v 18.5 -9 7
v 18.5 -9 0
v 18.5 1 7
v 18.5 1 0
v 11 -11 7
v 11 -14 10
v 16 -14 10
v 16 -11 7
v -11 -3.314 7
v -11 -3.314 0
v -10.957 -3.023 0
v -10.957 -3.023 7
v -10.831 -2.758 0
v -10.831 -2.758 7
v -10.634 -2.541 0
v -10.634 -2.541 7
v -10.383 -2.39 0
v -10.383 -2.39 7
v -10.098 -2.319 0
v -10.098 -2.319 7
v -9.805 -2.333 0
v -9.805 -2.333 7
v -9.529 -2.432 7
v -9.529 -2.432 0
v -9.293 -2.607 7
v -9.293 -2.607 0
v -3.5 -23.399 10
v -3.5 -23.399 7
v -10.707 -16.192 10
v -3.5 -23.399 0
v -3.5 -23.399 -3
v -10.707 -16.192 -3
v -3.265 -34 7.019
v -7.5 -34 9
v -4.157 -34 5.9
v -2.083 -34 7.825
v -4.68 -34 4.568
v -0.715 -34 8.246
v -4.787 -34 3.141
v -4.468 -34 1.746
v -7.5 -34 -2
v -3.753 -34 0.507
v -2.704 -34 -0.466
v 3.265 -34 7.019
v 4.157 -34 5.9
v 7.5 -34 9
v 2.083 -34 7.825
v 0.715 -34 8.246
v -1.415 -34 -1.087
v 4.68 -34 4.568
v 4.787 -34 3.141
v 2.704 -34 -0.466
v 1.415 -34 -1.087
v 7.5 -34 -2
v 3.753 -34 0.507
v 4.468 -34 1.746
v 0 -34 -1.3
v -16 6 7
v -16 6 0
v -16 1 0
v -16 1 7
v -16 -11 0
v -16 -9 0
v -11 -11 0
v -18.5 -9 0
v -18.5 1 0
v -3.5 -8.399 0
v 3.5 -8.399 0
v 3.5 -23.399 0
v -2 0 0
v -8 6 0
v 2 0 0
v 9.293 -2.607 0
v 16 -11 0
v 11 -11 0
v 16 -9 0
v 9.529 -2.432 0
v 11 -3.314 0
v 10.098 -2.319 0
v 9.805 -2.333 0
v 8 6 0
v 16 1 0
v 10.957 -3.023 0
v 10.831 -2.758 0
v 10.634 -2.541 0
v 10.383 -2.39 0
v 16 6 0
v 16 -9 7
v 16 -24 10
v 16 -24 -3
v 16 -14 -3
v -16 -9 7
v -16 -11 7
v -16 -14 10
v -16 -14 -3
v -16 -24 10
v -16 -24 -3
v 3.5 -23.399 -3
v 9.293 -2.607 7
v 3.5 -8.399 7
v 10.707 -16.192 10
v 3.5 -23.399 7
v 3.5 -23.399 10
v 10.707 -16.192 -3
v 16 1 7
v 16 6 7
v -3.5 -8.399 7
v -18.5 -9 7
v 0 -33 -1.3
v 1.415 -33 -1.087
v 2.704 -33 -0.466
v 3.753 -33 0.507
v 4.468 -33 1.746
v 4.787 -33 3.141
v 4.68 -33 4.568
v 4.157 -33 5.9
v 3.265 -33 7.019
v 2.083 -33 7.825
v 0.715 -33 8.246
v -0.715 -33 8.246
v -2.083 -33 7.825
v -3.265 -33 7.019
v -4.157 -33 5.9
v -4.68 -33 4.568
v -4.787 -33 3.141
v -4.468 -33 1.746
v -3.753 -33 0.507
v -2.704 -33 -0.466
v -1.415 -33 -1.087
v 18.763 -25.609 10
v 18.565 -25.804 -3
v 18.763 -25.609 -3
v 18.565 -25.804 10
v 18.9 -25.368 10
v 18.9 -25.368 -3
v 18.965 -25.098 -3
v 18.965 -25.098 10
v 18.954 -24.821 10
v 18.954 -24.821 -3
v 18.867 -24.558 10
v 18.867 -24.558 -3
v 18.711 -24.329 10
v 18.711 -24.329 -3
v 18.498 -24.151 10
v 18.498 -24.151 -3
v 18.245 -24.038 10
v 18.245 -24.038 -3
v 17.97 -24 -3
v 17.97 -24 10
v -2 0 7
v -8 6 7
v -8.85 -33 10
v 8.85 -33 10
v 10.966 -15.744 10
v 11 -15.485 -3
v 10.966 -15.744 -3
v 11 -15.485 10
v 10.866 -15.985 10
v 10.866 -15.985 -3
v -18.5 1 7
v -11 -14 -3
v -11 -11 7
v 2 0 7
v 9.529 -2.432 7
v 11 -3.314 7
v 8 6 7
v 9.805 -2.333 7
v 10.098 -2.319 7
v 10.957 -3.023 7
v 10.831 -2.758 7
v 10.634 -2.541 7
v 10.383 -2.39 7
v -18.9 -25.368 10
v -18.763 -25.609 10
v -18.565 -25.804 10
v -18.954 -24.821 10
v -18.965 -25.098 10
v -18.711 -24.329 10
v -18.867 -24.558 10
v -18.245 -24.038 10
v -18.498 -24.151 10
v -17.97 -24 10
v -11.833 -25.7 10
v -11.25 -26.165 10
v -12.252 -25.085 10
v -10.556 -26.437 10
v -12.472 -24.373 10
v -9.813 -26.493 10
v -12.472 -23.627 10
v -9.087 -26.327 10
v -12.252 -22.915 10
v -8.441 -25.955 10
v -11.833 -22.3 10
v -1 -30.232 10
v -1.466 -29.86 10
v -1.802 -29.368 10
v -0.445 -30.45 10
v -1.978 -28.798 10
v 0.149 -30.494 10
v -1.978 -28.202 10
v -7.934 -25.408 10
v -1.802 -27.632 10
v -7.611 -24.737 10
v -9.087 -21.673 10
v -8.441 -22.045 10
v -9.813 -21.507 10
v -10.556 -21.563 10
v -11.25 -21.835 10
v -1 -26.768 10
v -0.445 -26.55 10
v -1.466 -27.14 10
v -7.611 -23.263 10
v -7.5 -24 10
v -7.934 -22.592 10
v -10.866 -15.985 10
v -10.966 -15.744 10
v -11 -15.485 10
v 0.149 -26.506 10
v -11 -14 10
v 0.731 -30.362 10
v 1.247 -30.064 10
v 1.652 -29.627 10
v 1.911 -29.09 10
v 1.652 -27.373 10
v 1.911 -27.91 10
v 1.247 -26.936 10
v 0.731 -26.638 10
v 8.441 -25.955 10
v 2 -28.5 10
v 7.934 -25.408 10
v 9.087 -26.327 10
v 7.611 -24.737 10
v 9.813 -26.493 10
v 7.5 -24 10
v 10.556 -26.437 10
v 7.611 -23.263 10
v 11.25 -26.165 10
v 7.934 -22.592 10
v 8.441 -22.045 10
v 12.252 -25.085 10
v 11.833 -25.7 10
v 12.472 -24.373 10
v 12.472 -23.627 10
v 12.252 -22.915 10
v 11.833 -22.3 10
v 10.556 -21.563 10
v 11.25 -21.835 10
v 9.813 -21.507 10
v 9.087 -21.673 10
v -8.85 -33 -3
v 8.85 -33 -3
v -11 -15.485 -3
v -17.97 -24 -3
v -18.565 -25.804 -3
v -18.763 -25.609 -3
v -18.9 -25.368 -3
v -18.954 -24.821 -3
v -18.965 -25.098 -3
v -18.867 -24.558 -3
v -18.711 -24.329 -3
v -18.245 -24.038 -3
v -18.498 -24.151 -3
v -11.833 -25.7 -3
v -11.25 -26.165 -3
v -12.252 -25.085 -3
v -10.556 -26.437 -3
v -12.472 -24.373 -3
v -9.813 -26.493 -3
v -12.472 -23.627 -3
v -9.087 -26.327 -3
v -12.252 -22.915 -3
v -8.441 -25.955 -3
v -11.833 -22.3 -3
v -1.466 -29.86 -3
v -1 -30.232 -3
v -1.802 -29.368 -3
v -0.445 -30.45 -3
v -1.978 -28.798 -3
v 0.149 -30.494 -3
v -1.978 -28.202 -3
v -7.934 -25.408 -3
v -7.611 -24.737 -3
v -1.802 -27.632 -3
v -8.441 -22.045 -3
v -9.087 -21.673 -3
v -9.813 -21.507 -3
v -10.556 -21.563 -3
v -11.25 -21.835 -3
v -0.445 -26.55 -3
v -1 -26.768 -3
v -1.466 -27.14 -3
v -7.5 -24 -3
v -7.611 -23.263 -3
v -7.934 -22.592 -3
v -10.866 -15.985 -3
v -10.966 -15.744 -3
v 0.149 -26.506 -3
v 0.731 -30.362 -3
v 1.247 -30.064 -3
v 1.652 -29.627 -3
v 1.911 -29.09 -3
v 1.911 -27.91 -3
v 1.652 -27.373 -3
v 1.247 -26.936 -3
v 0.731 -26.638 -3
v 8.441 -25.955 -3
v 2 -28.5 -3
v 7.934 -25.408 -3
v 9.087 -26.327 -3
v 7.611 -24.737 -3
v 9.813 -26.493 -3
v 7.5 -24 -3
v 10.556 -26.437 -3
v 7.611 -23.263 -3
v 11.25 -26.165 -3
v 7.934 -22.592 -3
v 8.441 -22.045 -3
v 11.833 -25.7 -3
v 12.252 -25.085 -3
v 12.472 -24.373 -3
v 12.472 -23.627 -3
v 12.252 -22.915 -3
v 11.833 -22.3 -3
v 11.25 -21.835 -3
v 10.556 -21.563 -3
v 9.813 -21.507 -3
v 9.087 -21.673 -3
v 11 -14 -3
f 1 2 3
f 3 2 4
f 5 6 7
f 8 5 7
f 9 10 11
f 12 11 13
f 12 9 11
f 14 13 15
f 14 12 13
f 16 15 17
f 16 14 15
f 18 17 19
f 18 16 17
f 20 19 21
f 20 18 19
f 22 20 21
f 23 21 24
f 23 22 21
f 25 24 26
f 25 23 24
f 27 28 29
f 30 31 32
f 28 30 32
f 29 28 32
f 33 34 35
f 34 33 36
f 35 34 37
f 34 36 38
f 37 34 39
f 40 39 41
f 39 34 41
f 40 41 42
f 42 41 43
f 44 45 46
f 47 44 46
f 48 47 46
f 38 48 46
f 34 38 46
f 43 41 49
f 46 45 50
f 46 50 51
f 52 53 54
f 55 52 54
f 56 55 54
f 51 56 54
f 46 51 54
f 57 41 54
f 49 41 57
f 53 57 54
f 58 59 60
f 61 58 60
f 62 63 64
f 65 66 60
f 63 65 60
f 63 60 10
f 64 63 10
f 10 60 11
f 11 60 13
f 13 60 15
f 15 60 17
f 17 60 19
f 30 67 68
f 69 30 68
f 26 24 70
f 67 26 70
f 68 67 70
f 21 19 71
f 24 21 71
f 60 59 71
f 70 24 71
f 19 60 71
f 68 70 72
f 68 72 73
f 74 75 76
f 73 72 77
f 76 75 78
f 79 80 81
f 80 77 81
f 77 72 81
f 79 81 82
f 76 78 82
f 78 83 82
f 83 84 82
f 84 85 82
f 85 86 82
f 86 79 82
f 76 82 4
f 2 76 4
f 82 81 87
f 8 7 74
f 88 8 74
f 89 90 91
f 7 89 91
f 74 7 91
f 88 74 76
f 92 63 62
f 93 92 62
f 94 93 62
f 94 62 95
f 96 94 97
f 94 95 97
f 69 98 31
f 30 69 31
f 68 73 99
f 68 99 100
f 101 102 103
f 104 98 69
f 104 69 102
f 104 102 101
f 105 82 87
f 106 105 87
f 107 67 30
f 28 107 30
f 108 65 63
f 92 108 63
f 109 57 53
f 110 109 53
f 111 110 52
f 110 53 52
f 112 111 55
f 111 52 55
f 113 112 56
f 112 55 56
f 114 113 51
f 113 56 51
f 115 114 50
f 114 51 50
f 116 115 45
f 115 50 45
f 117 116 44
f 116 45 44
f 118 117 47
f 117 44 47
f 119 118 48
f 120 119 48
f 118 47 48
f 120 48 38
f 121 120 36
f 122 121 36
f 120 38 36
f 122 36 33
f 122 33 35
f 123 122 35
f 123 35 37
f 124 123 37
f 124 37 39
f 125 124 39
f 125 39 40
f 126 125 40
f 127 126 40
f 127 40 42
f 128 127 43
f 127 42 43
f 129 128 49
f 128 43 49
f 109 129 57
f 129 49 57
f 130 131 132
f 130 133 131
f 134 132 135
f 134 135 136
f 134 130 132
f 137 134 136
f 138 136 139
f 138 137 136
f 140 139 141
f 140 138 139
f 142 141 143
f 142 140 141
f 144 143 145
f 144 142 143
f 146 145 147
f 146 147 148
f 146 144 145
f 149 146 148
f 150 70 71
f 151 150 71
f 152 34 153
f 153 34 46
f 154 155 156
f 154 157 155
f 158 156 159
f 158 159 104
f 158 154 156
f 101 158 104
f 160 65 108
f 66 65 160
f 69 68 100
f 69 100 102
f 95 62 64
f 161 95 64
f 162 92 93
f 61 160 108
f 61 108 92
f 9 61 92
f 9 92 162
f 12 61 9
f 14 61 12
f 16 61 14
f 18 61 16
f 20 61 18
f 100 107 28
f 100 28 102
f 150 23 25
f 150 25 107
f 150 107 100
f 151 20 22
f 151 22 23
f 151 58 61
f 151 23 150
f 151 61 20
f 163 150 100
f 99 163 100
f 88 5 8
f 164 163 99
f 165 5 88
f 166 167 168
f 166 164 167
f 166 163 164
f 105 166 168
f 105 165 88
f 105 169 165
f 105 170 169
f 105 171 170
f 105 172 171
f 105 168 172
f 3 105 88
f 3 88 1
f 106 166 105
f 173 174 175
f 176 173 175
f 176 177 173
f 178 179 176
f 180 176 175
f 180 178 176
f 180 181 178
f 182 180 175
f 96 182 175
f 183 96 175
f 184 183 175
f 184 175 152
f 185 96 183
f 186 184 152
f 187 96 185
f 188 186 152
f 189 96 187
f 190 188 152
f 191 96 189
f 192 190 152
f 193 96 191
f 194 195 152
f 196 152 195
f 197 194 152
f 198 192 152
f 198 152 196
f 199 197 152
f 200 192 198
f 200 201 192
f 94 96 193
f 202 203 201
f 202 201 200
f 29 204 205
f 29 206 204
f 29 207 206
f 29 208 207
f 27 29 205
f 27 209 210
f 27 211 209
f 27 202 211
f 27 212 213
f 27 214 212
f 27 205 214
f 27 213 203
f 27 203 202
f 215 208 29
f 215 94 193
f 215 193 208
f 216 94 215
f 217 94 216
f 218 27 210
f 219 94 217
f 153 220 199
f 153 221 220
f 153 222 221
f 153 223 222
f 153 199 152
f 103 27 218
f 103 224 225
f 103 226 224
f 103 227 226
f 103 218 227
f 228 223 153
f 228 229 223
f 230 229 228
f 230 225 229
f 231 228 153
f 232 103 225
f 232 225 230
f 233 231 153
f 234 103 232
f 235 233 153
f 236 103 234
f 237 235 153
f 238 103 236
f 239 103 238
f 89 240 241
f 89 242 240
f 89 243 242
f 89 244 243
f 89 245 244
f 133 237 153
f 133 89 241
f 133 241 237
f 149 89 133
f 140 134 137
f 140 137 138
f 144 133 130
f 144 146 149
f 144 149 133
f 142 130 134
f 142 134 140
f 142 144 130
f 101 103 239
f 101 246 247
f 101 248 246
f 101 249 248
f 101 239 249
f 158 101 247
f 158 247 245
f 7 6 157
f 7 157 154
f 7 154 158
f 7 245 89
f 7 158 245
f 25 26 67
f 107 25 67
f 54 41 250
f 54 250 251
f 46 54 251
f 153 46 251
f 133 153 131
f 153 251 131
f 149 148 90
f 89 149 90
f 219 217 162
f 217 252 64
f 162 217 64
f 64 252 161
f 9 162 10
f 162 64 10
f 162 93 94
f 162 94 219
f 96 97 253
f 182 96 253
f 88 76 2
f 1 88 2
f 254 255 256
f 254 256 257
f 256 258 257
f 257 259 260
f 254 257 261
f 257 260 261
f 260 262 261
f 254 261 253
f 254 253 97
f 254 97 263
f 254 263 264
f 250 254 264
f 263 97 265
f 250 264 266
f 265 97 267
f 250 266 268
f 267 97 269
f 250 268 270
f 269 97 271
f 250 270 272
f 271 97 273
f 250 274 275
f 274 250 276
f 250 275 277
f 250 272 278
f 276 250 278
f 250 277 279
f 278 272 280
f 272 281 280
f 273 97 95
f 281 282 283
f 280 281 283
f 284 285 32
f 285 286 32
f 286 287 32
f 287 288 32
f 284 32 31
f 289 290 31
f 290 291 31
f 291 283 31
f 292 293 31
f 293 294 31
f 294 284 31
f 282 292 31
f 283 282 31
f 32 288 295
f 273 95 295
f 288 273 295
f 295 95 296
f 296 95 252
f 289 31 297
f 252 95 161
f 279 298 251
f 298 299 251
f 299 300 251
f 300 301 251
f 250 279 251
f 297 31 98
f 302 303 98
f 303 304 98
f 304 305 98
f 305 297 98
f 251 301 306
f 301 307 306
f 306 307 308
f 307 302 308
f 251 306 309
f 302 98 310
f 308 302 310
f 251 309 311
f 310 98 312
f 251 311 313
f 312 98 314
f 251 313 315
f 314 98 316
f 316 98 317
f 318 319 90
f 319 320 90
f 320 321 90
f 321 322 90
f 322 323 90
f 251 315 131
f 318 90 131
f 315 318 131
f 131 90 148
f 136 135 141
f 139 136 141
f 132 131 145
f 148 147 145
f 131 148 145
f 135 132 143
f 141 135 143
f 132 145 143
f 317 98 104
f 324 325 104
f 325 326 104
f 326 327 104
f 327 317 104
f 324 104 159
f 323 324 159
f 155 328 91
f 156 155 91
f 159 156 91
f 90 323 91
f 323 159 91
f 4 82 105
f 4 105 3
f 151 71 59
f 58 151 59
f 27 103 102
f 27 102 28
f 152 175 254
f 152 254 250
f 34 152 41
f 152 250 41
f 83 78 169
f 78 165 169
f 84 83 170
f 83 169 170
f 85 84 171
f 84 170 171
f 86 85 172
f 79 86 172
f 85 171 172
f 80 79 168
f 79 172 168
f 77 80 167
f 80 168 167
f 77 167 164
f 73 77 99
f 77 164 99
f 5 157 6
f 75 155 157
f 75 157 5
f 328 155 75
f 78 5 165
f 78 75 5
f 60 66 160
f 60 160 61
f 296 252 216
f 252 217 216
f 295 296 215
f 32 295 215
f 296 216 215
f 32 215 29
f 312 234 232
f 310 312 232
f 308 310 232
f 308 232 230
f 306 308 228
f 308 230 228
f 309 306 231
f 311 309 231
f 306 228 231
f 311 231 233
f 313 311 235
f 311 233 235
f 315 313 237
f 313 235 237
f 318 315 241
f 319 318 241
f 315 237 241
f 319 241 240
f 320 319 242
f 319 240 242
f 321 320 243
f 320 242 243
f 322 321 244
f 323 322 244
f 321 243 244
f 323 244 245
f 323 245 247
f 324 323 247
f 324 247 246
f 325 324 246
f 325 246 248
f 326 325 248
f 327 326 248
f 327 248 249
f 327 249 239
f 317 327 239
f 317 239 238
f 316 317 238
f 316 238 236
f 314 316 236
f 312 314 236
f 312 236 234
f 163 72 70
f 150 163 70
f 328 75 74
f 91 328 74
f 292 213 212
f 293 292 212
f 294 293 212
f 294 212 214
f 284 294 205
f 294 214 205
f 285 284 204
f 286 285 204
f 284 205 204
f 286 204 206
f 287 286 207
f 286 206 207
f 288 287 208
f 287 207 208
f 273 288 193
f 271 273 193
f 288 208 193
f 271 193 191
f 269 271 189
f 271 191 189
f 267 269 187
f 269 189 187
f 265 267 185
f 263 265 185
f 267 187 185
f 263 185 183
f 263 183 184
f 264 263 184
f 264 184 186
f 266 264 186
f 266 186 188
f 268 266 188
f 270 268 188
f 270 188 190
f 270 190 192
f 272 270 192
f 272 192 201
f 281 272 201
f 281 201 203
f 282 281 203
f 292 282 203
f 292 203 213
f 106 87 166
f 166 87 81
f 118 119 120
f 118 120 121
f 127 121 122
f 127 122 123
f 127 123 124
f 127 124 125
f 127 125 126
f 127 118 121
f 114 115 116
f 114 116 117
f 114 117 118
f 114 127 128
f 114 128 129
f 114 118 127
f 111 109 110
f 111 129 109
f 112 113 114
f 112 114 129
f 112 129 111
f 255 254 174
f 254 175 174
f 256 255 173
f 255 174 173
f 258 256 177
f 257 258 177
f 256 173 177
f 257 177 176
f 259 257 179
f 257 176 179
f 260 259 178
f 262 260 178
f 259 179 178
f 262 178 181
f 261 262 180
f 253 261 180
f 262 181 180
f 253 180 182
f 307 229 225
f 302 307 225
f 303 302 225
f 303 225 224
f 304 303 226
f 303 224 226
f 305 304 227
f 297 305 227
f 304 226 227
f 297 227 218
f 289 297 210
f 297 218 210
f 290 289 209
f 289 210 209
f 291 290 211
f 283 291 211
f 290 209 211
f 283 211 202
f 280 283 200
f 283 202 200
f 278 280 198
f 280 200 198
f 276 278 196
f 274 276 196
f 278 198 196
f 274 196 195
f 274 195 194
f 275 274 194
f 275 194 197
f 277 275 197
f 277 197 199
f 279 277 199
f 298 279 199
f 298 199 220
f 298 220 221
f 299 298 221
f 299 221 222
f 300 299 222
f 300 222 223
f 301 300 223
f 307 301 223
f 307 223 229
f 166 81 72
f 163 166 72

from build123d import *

# Parameters (mm, degrees)
ESQUISSE1_W             = 2.5
ESQUISSE1_H             = 10
BOSS_EXTRU_1_DEPTH      = 7
BOSS_EXTRU_2_DEPTH      = 3
BOSS_EXTRU_2_DEPTH_BACK = 10
ENL_V_MAT_EXTRU_1_REACH = 44.024
ESQUISSE4_4_W           = 7
ESQUISSE4_4_H           = 9.399494937
ENL_V_MAT_EXTRU_4_DEPTH = 3
ENL_V_START             = -13
ESQUISSE4_W             = 7
ESQUISSE4_H             = 9.399494937
ENL_V_MAT_EXTRU_2_DEPTH = 3
CHANFREIN1_SIZE         = 3
CONG_1_R                = 1
ESQUISSE5_R             = 4.8
ENL_V_MAT_EXTRU_5_DEPTH = 1
ESQUISSE6_R             = 2.5
ESQUISSE6_R_2           = 2
ENL_V_MAT_EXTRU_6_DEPTH = 42.047043387
CHANFREIN2_SIZE         = 1


with BuildPart() as part:
    # Esquisse1 → Boss.-Extru.1 (new body)
    with BuildSketch(Plane.XY):
        Polygon((-8, 6), (-16, 6), (-16, 1), (-16, -9), (-16, -24), (-21, -24), (-7.5, -34), (0, -34), (0, 0), (-2, 0), align=None)
        Polygon((2, 0), (0, 0), (0, -34), (7.5, -34), (21, -24), (16, -24), (16, -9), (16, 1), (16, 6), (8, 6), align=None)
        with Locations((17.25, -4)):
            Rectangle(ESQUISSE1_W, ESQUISSE1_H)
        with Locations((-17.25, -4)):
            Rectangle(ESQUISSE1_W, ESQUISSE1_H)
    extrude(amount=BOSS_EXTRU_1_DEPTH)

    # Esquisse2 → Boss.-Extru.2 (add, two sides: drawn at the far end of the back side and taken through both)
    with BuildSketch(Plane.XY.offset(7).offset(-BOSS_EXTRU_2_DEPTH_BACK)):
        Polygon((16, -14), (-16, -14), (-16, -24), (-21, -24), (-7.5, -34), (7.5, -34), (21, -24), (16, -24), align=None)
    extrude(amount=BOSS_EXTRU_2_DEPTH + BOSS_EXTRU_2_DEPTH_BACK)

    # Esquisse3 → Enlèv. mat.-Extru.1 (cut, up to next)
    with BuildSketch(Plane(origin=(0, 0, -3), x_dir=(-1, 0, 0), z_dir=(0, 0, -1)), mode=Mode.PRIVATE) as enl_v_mat_extru_1_sk1:
        Polygon((-11, -0.899494937), (-3.5, -8.399494937), (-3.5, -23.399494937), (-11, -15.899494937), align=None)
    enl_v_mat_extru_1_tool1 = extrude(enl_v_mat_extru_1_sk1.sketch, amount=-ENL_V_MAT_EXTRU_1_REACH, mode=Mode.PRIVATE) & part.part
    # Esquisse3 → Enlèv. mat.-Extru.1 (cut, up to next)
    with BuildSketch(Plane(origin=(0, 0, -3), x_dir=(-1, 0, 0), z_dir=(0, 0, -1)), mode=Mode.PRIVATE) as enl_v_mat_extru_1_sk2:
        Polygon((11, -15.899494937), (11, -0.899494937), (3.5, -8.399494937), (3.5, -23.399494937), align=None)
    enl_v_mat_extru_1_tool2 = extrude(enl_v_mat_extru_1_sk2.sketch, amount=-ENL_V_MAT_EXTRU_1_REACH, mode=Mode.PRIVATE) & part.part
    add(enl_v_mat_extru_1_tool1.solids().sort_by_distance((7.25, -12.149495, -3))[0], mode=Mode.SUBTRACT)
    add(enl_v_mat_extru_1_tool2.solids().sort_by_distance((-7.25, -12.149495, -3))[0], mode=Mode.SUBTRACT)

    # Esquisse4<4> → Enlèv. mat.-Extru.4 (cut)
    with BuildSketch(Plane(origin=(0, 0, -3), x_dir=(-1, 0, 0), z_dir=(0, 0, -1))):
        with Locations((0, -18.699747469)):
            Rectangle(ESQUISSE4_4_W, ESQUISSE4_4_H)
    extrude(amount=-ENL_V_MAT_EXTRU_4_DEPTH, mode=Mode.SUBTRACT)

    # Esquisse4 → Enlèv. mat.-Extru.2 (cut)
    with BuildSketch(Plane(origin=(0, 0, -3), x_dir=(-1, 0, 0), z_dir=(0, 0, -1)).offset(ENL_V_START)):
        with Locations((0, -18.699747469)):
            Rectangle(ESQUISSE4_W, ESQUISSE4_H)
    extrude(amount=ENL_V_MAT_EXTRU_2_DEPTH, mode=Mode.SUBTRACT)

    # Chanfrein1
    chanfrein1_edges = [part.edges().sort_by_distance(p)[0] for p in [
        (-13.5, -14, 0),
        (-13.5, -14, 7),
        (13.5, -14, 0),
        (13.5, -14, 7),
    ]]
    chamfer(chanfrein1_edges, length=CHANFREIN1_SIZE - 0.0001)  # a hair under: the kernel refuses the full size

    # Congé1
    cong_1_edges = [part.edges().sort_by_distance(p)[0] for p in [
        (11, -15.899494937, 3.5),
        (11, -0.899494937, 3.5),
        (-11, -0.899494937, 3.5),
        (-11, -15.899494937, 3.5),
        (-21, -24, 3.5),
        (21, -24, 3.5),
    ]]
    fillet(cong_1_edges, radius=CONG_1_R)

    # Esquisse5 → Enlèv. mat.-Extru.5 (cut)
    with BuildSketch(Plane.XZ.offset(34)):
        with Locations(Location((0, 3.5, 0), (0, 0, 270))):
            Circle(ESQUISSE5_R)
    extrude(amount=-ENL_V_MAT_EXTRU_5_DEPTH, mode=Mode.SUBTRACT)

    # Esquisse6 → Enlèv. mat.-Extru.6 (cut, through all)
    with BuildSketch(Plane.XY.offset(10)):
        with Locations((-10, -24)):
            Circle(ESQUISSE6_R)
        with Locations((0, -28.5)):
            Circle(ESQUISSE6_R_2)
        with Locations(Location((10, -24, 0), (0, 0, 180))):
            Circle(ESQUISSE6_R)
    extrude(amount=-ENL_V_MAT_EXTRU_6_DEPTH, mode=Mode.SUBTRACT)

    # Chanfrein2
    chanfrein2_edges = [part.edges().sort_by_distance(p)[0] for p in [
        (0, -34, -3),
        (0, -34, 10),
    ]]
    chamfer(chanfrein2_edges, length=CHANFREIN2_SIZE)


solid = part.part
